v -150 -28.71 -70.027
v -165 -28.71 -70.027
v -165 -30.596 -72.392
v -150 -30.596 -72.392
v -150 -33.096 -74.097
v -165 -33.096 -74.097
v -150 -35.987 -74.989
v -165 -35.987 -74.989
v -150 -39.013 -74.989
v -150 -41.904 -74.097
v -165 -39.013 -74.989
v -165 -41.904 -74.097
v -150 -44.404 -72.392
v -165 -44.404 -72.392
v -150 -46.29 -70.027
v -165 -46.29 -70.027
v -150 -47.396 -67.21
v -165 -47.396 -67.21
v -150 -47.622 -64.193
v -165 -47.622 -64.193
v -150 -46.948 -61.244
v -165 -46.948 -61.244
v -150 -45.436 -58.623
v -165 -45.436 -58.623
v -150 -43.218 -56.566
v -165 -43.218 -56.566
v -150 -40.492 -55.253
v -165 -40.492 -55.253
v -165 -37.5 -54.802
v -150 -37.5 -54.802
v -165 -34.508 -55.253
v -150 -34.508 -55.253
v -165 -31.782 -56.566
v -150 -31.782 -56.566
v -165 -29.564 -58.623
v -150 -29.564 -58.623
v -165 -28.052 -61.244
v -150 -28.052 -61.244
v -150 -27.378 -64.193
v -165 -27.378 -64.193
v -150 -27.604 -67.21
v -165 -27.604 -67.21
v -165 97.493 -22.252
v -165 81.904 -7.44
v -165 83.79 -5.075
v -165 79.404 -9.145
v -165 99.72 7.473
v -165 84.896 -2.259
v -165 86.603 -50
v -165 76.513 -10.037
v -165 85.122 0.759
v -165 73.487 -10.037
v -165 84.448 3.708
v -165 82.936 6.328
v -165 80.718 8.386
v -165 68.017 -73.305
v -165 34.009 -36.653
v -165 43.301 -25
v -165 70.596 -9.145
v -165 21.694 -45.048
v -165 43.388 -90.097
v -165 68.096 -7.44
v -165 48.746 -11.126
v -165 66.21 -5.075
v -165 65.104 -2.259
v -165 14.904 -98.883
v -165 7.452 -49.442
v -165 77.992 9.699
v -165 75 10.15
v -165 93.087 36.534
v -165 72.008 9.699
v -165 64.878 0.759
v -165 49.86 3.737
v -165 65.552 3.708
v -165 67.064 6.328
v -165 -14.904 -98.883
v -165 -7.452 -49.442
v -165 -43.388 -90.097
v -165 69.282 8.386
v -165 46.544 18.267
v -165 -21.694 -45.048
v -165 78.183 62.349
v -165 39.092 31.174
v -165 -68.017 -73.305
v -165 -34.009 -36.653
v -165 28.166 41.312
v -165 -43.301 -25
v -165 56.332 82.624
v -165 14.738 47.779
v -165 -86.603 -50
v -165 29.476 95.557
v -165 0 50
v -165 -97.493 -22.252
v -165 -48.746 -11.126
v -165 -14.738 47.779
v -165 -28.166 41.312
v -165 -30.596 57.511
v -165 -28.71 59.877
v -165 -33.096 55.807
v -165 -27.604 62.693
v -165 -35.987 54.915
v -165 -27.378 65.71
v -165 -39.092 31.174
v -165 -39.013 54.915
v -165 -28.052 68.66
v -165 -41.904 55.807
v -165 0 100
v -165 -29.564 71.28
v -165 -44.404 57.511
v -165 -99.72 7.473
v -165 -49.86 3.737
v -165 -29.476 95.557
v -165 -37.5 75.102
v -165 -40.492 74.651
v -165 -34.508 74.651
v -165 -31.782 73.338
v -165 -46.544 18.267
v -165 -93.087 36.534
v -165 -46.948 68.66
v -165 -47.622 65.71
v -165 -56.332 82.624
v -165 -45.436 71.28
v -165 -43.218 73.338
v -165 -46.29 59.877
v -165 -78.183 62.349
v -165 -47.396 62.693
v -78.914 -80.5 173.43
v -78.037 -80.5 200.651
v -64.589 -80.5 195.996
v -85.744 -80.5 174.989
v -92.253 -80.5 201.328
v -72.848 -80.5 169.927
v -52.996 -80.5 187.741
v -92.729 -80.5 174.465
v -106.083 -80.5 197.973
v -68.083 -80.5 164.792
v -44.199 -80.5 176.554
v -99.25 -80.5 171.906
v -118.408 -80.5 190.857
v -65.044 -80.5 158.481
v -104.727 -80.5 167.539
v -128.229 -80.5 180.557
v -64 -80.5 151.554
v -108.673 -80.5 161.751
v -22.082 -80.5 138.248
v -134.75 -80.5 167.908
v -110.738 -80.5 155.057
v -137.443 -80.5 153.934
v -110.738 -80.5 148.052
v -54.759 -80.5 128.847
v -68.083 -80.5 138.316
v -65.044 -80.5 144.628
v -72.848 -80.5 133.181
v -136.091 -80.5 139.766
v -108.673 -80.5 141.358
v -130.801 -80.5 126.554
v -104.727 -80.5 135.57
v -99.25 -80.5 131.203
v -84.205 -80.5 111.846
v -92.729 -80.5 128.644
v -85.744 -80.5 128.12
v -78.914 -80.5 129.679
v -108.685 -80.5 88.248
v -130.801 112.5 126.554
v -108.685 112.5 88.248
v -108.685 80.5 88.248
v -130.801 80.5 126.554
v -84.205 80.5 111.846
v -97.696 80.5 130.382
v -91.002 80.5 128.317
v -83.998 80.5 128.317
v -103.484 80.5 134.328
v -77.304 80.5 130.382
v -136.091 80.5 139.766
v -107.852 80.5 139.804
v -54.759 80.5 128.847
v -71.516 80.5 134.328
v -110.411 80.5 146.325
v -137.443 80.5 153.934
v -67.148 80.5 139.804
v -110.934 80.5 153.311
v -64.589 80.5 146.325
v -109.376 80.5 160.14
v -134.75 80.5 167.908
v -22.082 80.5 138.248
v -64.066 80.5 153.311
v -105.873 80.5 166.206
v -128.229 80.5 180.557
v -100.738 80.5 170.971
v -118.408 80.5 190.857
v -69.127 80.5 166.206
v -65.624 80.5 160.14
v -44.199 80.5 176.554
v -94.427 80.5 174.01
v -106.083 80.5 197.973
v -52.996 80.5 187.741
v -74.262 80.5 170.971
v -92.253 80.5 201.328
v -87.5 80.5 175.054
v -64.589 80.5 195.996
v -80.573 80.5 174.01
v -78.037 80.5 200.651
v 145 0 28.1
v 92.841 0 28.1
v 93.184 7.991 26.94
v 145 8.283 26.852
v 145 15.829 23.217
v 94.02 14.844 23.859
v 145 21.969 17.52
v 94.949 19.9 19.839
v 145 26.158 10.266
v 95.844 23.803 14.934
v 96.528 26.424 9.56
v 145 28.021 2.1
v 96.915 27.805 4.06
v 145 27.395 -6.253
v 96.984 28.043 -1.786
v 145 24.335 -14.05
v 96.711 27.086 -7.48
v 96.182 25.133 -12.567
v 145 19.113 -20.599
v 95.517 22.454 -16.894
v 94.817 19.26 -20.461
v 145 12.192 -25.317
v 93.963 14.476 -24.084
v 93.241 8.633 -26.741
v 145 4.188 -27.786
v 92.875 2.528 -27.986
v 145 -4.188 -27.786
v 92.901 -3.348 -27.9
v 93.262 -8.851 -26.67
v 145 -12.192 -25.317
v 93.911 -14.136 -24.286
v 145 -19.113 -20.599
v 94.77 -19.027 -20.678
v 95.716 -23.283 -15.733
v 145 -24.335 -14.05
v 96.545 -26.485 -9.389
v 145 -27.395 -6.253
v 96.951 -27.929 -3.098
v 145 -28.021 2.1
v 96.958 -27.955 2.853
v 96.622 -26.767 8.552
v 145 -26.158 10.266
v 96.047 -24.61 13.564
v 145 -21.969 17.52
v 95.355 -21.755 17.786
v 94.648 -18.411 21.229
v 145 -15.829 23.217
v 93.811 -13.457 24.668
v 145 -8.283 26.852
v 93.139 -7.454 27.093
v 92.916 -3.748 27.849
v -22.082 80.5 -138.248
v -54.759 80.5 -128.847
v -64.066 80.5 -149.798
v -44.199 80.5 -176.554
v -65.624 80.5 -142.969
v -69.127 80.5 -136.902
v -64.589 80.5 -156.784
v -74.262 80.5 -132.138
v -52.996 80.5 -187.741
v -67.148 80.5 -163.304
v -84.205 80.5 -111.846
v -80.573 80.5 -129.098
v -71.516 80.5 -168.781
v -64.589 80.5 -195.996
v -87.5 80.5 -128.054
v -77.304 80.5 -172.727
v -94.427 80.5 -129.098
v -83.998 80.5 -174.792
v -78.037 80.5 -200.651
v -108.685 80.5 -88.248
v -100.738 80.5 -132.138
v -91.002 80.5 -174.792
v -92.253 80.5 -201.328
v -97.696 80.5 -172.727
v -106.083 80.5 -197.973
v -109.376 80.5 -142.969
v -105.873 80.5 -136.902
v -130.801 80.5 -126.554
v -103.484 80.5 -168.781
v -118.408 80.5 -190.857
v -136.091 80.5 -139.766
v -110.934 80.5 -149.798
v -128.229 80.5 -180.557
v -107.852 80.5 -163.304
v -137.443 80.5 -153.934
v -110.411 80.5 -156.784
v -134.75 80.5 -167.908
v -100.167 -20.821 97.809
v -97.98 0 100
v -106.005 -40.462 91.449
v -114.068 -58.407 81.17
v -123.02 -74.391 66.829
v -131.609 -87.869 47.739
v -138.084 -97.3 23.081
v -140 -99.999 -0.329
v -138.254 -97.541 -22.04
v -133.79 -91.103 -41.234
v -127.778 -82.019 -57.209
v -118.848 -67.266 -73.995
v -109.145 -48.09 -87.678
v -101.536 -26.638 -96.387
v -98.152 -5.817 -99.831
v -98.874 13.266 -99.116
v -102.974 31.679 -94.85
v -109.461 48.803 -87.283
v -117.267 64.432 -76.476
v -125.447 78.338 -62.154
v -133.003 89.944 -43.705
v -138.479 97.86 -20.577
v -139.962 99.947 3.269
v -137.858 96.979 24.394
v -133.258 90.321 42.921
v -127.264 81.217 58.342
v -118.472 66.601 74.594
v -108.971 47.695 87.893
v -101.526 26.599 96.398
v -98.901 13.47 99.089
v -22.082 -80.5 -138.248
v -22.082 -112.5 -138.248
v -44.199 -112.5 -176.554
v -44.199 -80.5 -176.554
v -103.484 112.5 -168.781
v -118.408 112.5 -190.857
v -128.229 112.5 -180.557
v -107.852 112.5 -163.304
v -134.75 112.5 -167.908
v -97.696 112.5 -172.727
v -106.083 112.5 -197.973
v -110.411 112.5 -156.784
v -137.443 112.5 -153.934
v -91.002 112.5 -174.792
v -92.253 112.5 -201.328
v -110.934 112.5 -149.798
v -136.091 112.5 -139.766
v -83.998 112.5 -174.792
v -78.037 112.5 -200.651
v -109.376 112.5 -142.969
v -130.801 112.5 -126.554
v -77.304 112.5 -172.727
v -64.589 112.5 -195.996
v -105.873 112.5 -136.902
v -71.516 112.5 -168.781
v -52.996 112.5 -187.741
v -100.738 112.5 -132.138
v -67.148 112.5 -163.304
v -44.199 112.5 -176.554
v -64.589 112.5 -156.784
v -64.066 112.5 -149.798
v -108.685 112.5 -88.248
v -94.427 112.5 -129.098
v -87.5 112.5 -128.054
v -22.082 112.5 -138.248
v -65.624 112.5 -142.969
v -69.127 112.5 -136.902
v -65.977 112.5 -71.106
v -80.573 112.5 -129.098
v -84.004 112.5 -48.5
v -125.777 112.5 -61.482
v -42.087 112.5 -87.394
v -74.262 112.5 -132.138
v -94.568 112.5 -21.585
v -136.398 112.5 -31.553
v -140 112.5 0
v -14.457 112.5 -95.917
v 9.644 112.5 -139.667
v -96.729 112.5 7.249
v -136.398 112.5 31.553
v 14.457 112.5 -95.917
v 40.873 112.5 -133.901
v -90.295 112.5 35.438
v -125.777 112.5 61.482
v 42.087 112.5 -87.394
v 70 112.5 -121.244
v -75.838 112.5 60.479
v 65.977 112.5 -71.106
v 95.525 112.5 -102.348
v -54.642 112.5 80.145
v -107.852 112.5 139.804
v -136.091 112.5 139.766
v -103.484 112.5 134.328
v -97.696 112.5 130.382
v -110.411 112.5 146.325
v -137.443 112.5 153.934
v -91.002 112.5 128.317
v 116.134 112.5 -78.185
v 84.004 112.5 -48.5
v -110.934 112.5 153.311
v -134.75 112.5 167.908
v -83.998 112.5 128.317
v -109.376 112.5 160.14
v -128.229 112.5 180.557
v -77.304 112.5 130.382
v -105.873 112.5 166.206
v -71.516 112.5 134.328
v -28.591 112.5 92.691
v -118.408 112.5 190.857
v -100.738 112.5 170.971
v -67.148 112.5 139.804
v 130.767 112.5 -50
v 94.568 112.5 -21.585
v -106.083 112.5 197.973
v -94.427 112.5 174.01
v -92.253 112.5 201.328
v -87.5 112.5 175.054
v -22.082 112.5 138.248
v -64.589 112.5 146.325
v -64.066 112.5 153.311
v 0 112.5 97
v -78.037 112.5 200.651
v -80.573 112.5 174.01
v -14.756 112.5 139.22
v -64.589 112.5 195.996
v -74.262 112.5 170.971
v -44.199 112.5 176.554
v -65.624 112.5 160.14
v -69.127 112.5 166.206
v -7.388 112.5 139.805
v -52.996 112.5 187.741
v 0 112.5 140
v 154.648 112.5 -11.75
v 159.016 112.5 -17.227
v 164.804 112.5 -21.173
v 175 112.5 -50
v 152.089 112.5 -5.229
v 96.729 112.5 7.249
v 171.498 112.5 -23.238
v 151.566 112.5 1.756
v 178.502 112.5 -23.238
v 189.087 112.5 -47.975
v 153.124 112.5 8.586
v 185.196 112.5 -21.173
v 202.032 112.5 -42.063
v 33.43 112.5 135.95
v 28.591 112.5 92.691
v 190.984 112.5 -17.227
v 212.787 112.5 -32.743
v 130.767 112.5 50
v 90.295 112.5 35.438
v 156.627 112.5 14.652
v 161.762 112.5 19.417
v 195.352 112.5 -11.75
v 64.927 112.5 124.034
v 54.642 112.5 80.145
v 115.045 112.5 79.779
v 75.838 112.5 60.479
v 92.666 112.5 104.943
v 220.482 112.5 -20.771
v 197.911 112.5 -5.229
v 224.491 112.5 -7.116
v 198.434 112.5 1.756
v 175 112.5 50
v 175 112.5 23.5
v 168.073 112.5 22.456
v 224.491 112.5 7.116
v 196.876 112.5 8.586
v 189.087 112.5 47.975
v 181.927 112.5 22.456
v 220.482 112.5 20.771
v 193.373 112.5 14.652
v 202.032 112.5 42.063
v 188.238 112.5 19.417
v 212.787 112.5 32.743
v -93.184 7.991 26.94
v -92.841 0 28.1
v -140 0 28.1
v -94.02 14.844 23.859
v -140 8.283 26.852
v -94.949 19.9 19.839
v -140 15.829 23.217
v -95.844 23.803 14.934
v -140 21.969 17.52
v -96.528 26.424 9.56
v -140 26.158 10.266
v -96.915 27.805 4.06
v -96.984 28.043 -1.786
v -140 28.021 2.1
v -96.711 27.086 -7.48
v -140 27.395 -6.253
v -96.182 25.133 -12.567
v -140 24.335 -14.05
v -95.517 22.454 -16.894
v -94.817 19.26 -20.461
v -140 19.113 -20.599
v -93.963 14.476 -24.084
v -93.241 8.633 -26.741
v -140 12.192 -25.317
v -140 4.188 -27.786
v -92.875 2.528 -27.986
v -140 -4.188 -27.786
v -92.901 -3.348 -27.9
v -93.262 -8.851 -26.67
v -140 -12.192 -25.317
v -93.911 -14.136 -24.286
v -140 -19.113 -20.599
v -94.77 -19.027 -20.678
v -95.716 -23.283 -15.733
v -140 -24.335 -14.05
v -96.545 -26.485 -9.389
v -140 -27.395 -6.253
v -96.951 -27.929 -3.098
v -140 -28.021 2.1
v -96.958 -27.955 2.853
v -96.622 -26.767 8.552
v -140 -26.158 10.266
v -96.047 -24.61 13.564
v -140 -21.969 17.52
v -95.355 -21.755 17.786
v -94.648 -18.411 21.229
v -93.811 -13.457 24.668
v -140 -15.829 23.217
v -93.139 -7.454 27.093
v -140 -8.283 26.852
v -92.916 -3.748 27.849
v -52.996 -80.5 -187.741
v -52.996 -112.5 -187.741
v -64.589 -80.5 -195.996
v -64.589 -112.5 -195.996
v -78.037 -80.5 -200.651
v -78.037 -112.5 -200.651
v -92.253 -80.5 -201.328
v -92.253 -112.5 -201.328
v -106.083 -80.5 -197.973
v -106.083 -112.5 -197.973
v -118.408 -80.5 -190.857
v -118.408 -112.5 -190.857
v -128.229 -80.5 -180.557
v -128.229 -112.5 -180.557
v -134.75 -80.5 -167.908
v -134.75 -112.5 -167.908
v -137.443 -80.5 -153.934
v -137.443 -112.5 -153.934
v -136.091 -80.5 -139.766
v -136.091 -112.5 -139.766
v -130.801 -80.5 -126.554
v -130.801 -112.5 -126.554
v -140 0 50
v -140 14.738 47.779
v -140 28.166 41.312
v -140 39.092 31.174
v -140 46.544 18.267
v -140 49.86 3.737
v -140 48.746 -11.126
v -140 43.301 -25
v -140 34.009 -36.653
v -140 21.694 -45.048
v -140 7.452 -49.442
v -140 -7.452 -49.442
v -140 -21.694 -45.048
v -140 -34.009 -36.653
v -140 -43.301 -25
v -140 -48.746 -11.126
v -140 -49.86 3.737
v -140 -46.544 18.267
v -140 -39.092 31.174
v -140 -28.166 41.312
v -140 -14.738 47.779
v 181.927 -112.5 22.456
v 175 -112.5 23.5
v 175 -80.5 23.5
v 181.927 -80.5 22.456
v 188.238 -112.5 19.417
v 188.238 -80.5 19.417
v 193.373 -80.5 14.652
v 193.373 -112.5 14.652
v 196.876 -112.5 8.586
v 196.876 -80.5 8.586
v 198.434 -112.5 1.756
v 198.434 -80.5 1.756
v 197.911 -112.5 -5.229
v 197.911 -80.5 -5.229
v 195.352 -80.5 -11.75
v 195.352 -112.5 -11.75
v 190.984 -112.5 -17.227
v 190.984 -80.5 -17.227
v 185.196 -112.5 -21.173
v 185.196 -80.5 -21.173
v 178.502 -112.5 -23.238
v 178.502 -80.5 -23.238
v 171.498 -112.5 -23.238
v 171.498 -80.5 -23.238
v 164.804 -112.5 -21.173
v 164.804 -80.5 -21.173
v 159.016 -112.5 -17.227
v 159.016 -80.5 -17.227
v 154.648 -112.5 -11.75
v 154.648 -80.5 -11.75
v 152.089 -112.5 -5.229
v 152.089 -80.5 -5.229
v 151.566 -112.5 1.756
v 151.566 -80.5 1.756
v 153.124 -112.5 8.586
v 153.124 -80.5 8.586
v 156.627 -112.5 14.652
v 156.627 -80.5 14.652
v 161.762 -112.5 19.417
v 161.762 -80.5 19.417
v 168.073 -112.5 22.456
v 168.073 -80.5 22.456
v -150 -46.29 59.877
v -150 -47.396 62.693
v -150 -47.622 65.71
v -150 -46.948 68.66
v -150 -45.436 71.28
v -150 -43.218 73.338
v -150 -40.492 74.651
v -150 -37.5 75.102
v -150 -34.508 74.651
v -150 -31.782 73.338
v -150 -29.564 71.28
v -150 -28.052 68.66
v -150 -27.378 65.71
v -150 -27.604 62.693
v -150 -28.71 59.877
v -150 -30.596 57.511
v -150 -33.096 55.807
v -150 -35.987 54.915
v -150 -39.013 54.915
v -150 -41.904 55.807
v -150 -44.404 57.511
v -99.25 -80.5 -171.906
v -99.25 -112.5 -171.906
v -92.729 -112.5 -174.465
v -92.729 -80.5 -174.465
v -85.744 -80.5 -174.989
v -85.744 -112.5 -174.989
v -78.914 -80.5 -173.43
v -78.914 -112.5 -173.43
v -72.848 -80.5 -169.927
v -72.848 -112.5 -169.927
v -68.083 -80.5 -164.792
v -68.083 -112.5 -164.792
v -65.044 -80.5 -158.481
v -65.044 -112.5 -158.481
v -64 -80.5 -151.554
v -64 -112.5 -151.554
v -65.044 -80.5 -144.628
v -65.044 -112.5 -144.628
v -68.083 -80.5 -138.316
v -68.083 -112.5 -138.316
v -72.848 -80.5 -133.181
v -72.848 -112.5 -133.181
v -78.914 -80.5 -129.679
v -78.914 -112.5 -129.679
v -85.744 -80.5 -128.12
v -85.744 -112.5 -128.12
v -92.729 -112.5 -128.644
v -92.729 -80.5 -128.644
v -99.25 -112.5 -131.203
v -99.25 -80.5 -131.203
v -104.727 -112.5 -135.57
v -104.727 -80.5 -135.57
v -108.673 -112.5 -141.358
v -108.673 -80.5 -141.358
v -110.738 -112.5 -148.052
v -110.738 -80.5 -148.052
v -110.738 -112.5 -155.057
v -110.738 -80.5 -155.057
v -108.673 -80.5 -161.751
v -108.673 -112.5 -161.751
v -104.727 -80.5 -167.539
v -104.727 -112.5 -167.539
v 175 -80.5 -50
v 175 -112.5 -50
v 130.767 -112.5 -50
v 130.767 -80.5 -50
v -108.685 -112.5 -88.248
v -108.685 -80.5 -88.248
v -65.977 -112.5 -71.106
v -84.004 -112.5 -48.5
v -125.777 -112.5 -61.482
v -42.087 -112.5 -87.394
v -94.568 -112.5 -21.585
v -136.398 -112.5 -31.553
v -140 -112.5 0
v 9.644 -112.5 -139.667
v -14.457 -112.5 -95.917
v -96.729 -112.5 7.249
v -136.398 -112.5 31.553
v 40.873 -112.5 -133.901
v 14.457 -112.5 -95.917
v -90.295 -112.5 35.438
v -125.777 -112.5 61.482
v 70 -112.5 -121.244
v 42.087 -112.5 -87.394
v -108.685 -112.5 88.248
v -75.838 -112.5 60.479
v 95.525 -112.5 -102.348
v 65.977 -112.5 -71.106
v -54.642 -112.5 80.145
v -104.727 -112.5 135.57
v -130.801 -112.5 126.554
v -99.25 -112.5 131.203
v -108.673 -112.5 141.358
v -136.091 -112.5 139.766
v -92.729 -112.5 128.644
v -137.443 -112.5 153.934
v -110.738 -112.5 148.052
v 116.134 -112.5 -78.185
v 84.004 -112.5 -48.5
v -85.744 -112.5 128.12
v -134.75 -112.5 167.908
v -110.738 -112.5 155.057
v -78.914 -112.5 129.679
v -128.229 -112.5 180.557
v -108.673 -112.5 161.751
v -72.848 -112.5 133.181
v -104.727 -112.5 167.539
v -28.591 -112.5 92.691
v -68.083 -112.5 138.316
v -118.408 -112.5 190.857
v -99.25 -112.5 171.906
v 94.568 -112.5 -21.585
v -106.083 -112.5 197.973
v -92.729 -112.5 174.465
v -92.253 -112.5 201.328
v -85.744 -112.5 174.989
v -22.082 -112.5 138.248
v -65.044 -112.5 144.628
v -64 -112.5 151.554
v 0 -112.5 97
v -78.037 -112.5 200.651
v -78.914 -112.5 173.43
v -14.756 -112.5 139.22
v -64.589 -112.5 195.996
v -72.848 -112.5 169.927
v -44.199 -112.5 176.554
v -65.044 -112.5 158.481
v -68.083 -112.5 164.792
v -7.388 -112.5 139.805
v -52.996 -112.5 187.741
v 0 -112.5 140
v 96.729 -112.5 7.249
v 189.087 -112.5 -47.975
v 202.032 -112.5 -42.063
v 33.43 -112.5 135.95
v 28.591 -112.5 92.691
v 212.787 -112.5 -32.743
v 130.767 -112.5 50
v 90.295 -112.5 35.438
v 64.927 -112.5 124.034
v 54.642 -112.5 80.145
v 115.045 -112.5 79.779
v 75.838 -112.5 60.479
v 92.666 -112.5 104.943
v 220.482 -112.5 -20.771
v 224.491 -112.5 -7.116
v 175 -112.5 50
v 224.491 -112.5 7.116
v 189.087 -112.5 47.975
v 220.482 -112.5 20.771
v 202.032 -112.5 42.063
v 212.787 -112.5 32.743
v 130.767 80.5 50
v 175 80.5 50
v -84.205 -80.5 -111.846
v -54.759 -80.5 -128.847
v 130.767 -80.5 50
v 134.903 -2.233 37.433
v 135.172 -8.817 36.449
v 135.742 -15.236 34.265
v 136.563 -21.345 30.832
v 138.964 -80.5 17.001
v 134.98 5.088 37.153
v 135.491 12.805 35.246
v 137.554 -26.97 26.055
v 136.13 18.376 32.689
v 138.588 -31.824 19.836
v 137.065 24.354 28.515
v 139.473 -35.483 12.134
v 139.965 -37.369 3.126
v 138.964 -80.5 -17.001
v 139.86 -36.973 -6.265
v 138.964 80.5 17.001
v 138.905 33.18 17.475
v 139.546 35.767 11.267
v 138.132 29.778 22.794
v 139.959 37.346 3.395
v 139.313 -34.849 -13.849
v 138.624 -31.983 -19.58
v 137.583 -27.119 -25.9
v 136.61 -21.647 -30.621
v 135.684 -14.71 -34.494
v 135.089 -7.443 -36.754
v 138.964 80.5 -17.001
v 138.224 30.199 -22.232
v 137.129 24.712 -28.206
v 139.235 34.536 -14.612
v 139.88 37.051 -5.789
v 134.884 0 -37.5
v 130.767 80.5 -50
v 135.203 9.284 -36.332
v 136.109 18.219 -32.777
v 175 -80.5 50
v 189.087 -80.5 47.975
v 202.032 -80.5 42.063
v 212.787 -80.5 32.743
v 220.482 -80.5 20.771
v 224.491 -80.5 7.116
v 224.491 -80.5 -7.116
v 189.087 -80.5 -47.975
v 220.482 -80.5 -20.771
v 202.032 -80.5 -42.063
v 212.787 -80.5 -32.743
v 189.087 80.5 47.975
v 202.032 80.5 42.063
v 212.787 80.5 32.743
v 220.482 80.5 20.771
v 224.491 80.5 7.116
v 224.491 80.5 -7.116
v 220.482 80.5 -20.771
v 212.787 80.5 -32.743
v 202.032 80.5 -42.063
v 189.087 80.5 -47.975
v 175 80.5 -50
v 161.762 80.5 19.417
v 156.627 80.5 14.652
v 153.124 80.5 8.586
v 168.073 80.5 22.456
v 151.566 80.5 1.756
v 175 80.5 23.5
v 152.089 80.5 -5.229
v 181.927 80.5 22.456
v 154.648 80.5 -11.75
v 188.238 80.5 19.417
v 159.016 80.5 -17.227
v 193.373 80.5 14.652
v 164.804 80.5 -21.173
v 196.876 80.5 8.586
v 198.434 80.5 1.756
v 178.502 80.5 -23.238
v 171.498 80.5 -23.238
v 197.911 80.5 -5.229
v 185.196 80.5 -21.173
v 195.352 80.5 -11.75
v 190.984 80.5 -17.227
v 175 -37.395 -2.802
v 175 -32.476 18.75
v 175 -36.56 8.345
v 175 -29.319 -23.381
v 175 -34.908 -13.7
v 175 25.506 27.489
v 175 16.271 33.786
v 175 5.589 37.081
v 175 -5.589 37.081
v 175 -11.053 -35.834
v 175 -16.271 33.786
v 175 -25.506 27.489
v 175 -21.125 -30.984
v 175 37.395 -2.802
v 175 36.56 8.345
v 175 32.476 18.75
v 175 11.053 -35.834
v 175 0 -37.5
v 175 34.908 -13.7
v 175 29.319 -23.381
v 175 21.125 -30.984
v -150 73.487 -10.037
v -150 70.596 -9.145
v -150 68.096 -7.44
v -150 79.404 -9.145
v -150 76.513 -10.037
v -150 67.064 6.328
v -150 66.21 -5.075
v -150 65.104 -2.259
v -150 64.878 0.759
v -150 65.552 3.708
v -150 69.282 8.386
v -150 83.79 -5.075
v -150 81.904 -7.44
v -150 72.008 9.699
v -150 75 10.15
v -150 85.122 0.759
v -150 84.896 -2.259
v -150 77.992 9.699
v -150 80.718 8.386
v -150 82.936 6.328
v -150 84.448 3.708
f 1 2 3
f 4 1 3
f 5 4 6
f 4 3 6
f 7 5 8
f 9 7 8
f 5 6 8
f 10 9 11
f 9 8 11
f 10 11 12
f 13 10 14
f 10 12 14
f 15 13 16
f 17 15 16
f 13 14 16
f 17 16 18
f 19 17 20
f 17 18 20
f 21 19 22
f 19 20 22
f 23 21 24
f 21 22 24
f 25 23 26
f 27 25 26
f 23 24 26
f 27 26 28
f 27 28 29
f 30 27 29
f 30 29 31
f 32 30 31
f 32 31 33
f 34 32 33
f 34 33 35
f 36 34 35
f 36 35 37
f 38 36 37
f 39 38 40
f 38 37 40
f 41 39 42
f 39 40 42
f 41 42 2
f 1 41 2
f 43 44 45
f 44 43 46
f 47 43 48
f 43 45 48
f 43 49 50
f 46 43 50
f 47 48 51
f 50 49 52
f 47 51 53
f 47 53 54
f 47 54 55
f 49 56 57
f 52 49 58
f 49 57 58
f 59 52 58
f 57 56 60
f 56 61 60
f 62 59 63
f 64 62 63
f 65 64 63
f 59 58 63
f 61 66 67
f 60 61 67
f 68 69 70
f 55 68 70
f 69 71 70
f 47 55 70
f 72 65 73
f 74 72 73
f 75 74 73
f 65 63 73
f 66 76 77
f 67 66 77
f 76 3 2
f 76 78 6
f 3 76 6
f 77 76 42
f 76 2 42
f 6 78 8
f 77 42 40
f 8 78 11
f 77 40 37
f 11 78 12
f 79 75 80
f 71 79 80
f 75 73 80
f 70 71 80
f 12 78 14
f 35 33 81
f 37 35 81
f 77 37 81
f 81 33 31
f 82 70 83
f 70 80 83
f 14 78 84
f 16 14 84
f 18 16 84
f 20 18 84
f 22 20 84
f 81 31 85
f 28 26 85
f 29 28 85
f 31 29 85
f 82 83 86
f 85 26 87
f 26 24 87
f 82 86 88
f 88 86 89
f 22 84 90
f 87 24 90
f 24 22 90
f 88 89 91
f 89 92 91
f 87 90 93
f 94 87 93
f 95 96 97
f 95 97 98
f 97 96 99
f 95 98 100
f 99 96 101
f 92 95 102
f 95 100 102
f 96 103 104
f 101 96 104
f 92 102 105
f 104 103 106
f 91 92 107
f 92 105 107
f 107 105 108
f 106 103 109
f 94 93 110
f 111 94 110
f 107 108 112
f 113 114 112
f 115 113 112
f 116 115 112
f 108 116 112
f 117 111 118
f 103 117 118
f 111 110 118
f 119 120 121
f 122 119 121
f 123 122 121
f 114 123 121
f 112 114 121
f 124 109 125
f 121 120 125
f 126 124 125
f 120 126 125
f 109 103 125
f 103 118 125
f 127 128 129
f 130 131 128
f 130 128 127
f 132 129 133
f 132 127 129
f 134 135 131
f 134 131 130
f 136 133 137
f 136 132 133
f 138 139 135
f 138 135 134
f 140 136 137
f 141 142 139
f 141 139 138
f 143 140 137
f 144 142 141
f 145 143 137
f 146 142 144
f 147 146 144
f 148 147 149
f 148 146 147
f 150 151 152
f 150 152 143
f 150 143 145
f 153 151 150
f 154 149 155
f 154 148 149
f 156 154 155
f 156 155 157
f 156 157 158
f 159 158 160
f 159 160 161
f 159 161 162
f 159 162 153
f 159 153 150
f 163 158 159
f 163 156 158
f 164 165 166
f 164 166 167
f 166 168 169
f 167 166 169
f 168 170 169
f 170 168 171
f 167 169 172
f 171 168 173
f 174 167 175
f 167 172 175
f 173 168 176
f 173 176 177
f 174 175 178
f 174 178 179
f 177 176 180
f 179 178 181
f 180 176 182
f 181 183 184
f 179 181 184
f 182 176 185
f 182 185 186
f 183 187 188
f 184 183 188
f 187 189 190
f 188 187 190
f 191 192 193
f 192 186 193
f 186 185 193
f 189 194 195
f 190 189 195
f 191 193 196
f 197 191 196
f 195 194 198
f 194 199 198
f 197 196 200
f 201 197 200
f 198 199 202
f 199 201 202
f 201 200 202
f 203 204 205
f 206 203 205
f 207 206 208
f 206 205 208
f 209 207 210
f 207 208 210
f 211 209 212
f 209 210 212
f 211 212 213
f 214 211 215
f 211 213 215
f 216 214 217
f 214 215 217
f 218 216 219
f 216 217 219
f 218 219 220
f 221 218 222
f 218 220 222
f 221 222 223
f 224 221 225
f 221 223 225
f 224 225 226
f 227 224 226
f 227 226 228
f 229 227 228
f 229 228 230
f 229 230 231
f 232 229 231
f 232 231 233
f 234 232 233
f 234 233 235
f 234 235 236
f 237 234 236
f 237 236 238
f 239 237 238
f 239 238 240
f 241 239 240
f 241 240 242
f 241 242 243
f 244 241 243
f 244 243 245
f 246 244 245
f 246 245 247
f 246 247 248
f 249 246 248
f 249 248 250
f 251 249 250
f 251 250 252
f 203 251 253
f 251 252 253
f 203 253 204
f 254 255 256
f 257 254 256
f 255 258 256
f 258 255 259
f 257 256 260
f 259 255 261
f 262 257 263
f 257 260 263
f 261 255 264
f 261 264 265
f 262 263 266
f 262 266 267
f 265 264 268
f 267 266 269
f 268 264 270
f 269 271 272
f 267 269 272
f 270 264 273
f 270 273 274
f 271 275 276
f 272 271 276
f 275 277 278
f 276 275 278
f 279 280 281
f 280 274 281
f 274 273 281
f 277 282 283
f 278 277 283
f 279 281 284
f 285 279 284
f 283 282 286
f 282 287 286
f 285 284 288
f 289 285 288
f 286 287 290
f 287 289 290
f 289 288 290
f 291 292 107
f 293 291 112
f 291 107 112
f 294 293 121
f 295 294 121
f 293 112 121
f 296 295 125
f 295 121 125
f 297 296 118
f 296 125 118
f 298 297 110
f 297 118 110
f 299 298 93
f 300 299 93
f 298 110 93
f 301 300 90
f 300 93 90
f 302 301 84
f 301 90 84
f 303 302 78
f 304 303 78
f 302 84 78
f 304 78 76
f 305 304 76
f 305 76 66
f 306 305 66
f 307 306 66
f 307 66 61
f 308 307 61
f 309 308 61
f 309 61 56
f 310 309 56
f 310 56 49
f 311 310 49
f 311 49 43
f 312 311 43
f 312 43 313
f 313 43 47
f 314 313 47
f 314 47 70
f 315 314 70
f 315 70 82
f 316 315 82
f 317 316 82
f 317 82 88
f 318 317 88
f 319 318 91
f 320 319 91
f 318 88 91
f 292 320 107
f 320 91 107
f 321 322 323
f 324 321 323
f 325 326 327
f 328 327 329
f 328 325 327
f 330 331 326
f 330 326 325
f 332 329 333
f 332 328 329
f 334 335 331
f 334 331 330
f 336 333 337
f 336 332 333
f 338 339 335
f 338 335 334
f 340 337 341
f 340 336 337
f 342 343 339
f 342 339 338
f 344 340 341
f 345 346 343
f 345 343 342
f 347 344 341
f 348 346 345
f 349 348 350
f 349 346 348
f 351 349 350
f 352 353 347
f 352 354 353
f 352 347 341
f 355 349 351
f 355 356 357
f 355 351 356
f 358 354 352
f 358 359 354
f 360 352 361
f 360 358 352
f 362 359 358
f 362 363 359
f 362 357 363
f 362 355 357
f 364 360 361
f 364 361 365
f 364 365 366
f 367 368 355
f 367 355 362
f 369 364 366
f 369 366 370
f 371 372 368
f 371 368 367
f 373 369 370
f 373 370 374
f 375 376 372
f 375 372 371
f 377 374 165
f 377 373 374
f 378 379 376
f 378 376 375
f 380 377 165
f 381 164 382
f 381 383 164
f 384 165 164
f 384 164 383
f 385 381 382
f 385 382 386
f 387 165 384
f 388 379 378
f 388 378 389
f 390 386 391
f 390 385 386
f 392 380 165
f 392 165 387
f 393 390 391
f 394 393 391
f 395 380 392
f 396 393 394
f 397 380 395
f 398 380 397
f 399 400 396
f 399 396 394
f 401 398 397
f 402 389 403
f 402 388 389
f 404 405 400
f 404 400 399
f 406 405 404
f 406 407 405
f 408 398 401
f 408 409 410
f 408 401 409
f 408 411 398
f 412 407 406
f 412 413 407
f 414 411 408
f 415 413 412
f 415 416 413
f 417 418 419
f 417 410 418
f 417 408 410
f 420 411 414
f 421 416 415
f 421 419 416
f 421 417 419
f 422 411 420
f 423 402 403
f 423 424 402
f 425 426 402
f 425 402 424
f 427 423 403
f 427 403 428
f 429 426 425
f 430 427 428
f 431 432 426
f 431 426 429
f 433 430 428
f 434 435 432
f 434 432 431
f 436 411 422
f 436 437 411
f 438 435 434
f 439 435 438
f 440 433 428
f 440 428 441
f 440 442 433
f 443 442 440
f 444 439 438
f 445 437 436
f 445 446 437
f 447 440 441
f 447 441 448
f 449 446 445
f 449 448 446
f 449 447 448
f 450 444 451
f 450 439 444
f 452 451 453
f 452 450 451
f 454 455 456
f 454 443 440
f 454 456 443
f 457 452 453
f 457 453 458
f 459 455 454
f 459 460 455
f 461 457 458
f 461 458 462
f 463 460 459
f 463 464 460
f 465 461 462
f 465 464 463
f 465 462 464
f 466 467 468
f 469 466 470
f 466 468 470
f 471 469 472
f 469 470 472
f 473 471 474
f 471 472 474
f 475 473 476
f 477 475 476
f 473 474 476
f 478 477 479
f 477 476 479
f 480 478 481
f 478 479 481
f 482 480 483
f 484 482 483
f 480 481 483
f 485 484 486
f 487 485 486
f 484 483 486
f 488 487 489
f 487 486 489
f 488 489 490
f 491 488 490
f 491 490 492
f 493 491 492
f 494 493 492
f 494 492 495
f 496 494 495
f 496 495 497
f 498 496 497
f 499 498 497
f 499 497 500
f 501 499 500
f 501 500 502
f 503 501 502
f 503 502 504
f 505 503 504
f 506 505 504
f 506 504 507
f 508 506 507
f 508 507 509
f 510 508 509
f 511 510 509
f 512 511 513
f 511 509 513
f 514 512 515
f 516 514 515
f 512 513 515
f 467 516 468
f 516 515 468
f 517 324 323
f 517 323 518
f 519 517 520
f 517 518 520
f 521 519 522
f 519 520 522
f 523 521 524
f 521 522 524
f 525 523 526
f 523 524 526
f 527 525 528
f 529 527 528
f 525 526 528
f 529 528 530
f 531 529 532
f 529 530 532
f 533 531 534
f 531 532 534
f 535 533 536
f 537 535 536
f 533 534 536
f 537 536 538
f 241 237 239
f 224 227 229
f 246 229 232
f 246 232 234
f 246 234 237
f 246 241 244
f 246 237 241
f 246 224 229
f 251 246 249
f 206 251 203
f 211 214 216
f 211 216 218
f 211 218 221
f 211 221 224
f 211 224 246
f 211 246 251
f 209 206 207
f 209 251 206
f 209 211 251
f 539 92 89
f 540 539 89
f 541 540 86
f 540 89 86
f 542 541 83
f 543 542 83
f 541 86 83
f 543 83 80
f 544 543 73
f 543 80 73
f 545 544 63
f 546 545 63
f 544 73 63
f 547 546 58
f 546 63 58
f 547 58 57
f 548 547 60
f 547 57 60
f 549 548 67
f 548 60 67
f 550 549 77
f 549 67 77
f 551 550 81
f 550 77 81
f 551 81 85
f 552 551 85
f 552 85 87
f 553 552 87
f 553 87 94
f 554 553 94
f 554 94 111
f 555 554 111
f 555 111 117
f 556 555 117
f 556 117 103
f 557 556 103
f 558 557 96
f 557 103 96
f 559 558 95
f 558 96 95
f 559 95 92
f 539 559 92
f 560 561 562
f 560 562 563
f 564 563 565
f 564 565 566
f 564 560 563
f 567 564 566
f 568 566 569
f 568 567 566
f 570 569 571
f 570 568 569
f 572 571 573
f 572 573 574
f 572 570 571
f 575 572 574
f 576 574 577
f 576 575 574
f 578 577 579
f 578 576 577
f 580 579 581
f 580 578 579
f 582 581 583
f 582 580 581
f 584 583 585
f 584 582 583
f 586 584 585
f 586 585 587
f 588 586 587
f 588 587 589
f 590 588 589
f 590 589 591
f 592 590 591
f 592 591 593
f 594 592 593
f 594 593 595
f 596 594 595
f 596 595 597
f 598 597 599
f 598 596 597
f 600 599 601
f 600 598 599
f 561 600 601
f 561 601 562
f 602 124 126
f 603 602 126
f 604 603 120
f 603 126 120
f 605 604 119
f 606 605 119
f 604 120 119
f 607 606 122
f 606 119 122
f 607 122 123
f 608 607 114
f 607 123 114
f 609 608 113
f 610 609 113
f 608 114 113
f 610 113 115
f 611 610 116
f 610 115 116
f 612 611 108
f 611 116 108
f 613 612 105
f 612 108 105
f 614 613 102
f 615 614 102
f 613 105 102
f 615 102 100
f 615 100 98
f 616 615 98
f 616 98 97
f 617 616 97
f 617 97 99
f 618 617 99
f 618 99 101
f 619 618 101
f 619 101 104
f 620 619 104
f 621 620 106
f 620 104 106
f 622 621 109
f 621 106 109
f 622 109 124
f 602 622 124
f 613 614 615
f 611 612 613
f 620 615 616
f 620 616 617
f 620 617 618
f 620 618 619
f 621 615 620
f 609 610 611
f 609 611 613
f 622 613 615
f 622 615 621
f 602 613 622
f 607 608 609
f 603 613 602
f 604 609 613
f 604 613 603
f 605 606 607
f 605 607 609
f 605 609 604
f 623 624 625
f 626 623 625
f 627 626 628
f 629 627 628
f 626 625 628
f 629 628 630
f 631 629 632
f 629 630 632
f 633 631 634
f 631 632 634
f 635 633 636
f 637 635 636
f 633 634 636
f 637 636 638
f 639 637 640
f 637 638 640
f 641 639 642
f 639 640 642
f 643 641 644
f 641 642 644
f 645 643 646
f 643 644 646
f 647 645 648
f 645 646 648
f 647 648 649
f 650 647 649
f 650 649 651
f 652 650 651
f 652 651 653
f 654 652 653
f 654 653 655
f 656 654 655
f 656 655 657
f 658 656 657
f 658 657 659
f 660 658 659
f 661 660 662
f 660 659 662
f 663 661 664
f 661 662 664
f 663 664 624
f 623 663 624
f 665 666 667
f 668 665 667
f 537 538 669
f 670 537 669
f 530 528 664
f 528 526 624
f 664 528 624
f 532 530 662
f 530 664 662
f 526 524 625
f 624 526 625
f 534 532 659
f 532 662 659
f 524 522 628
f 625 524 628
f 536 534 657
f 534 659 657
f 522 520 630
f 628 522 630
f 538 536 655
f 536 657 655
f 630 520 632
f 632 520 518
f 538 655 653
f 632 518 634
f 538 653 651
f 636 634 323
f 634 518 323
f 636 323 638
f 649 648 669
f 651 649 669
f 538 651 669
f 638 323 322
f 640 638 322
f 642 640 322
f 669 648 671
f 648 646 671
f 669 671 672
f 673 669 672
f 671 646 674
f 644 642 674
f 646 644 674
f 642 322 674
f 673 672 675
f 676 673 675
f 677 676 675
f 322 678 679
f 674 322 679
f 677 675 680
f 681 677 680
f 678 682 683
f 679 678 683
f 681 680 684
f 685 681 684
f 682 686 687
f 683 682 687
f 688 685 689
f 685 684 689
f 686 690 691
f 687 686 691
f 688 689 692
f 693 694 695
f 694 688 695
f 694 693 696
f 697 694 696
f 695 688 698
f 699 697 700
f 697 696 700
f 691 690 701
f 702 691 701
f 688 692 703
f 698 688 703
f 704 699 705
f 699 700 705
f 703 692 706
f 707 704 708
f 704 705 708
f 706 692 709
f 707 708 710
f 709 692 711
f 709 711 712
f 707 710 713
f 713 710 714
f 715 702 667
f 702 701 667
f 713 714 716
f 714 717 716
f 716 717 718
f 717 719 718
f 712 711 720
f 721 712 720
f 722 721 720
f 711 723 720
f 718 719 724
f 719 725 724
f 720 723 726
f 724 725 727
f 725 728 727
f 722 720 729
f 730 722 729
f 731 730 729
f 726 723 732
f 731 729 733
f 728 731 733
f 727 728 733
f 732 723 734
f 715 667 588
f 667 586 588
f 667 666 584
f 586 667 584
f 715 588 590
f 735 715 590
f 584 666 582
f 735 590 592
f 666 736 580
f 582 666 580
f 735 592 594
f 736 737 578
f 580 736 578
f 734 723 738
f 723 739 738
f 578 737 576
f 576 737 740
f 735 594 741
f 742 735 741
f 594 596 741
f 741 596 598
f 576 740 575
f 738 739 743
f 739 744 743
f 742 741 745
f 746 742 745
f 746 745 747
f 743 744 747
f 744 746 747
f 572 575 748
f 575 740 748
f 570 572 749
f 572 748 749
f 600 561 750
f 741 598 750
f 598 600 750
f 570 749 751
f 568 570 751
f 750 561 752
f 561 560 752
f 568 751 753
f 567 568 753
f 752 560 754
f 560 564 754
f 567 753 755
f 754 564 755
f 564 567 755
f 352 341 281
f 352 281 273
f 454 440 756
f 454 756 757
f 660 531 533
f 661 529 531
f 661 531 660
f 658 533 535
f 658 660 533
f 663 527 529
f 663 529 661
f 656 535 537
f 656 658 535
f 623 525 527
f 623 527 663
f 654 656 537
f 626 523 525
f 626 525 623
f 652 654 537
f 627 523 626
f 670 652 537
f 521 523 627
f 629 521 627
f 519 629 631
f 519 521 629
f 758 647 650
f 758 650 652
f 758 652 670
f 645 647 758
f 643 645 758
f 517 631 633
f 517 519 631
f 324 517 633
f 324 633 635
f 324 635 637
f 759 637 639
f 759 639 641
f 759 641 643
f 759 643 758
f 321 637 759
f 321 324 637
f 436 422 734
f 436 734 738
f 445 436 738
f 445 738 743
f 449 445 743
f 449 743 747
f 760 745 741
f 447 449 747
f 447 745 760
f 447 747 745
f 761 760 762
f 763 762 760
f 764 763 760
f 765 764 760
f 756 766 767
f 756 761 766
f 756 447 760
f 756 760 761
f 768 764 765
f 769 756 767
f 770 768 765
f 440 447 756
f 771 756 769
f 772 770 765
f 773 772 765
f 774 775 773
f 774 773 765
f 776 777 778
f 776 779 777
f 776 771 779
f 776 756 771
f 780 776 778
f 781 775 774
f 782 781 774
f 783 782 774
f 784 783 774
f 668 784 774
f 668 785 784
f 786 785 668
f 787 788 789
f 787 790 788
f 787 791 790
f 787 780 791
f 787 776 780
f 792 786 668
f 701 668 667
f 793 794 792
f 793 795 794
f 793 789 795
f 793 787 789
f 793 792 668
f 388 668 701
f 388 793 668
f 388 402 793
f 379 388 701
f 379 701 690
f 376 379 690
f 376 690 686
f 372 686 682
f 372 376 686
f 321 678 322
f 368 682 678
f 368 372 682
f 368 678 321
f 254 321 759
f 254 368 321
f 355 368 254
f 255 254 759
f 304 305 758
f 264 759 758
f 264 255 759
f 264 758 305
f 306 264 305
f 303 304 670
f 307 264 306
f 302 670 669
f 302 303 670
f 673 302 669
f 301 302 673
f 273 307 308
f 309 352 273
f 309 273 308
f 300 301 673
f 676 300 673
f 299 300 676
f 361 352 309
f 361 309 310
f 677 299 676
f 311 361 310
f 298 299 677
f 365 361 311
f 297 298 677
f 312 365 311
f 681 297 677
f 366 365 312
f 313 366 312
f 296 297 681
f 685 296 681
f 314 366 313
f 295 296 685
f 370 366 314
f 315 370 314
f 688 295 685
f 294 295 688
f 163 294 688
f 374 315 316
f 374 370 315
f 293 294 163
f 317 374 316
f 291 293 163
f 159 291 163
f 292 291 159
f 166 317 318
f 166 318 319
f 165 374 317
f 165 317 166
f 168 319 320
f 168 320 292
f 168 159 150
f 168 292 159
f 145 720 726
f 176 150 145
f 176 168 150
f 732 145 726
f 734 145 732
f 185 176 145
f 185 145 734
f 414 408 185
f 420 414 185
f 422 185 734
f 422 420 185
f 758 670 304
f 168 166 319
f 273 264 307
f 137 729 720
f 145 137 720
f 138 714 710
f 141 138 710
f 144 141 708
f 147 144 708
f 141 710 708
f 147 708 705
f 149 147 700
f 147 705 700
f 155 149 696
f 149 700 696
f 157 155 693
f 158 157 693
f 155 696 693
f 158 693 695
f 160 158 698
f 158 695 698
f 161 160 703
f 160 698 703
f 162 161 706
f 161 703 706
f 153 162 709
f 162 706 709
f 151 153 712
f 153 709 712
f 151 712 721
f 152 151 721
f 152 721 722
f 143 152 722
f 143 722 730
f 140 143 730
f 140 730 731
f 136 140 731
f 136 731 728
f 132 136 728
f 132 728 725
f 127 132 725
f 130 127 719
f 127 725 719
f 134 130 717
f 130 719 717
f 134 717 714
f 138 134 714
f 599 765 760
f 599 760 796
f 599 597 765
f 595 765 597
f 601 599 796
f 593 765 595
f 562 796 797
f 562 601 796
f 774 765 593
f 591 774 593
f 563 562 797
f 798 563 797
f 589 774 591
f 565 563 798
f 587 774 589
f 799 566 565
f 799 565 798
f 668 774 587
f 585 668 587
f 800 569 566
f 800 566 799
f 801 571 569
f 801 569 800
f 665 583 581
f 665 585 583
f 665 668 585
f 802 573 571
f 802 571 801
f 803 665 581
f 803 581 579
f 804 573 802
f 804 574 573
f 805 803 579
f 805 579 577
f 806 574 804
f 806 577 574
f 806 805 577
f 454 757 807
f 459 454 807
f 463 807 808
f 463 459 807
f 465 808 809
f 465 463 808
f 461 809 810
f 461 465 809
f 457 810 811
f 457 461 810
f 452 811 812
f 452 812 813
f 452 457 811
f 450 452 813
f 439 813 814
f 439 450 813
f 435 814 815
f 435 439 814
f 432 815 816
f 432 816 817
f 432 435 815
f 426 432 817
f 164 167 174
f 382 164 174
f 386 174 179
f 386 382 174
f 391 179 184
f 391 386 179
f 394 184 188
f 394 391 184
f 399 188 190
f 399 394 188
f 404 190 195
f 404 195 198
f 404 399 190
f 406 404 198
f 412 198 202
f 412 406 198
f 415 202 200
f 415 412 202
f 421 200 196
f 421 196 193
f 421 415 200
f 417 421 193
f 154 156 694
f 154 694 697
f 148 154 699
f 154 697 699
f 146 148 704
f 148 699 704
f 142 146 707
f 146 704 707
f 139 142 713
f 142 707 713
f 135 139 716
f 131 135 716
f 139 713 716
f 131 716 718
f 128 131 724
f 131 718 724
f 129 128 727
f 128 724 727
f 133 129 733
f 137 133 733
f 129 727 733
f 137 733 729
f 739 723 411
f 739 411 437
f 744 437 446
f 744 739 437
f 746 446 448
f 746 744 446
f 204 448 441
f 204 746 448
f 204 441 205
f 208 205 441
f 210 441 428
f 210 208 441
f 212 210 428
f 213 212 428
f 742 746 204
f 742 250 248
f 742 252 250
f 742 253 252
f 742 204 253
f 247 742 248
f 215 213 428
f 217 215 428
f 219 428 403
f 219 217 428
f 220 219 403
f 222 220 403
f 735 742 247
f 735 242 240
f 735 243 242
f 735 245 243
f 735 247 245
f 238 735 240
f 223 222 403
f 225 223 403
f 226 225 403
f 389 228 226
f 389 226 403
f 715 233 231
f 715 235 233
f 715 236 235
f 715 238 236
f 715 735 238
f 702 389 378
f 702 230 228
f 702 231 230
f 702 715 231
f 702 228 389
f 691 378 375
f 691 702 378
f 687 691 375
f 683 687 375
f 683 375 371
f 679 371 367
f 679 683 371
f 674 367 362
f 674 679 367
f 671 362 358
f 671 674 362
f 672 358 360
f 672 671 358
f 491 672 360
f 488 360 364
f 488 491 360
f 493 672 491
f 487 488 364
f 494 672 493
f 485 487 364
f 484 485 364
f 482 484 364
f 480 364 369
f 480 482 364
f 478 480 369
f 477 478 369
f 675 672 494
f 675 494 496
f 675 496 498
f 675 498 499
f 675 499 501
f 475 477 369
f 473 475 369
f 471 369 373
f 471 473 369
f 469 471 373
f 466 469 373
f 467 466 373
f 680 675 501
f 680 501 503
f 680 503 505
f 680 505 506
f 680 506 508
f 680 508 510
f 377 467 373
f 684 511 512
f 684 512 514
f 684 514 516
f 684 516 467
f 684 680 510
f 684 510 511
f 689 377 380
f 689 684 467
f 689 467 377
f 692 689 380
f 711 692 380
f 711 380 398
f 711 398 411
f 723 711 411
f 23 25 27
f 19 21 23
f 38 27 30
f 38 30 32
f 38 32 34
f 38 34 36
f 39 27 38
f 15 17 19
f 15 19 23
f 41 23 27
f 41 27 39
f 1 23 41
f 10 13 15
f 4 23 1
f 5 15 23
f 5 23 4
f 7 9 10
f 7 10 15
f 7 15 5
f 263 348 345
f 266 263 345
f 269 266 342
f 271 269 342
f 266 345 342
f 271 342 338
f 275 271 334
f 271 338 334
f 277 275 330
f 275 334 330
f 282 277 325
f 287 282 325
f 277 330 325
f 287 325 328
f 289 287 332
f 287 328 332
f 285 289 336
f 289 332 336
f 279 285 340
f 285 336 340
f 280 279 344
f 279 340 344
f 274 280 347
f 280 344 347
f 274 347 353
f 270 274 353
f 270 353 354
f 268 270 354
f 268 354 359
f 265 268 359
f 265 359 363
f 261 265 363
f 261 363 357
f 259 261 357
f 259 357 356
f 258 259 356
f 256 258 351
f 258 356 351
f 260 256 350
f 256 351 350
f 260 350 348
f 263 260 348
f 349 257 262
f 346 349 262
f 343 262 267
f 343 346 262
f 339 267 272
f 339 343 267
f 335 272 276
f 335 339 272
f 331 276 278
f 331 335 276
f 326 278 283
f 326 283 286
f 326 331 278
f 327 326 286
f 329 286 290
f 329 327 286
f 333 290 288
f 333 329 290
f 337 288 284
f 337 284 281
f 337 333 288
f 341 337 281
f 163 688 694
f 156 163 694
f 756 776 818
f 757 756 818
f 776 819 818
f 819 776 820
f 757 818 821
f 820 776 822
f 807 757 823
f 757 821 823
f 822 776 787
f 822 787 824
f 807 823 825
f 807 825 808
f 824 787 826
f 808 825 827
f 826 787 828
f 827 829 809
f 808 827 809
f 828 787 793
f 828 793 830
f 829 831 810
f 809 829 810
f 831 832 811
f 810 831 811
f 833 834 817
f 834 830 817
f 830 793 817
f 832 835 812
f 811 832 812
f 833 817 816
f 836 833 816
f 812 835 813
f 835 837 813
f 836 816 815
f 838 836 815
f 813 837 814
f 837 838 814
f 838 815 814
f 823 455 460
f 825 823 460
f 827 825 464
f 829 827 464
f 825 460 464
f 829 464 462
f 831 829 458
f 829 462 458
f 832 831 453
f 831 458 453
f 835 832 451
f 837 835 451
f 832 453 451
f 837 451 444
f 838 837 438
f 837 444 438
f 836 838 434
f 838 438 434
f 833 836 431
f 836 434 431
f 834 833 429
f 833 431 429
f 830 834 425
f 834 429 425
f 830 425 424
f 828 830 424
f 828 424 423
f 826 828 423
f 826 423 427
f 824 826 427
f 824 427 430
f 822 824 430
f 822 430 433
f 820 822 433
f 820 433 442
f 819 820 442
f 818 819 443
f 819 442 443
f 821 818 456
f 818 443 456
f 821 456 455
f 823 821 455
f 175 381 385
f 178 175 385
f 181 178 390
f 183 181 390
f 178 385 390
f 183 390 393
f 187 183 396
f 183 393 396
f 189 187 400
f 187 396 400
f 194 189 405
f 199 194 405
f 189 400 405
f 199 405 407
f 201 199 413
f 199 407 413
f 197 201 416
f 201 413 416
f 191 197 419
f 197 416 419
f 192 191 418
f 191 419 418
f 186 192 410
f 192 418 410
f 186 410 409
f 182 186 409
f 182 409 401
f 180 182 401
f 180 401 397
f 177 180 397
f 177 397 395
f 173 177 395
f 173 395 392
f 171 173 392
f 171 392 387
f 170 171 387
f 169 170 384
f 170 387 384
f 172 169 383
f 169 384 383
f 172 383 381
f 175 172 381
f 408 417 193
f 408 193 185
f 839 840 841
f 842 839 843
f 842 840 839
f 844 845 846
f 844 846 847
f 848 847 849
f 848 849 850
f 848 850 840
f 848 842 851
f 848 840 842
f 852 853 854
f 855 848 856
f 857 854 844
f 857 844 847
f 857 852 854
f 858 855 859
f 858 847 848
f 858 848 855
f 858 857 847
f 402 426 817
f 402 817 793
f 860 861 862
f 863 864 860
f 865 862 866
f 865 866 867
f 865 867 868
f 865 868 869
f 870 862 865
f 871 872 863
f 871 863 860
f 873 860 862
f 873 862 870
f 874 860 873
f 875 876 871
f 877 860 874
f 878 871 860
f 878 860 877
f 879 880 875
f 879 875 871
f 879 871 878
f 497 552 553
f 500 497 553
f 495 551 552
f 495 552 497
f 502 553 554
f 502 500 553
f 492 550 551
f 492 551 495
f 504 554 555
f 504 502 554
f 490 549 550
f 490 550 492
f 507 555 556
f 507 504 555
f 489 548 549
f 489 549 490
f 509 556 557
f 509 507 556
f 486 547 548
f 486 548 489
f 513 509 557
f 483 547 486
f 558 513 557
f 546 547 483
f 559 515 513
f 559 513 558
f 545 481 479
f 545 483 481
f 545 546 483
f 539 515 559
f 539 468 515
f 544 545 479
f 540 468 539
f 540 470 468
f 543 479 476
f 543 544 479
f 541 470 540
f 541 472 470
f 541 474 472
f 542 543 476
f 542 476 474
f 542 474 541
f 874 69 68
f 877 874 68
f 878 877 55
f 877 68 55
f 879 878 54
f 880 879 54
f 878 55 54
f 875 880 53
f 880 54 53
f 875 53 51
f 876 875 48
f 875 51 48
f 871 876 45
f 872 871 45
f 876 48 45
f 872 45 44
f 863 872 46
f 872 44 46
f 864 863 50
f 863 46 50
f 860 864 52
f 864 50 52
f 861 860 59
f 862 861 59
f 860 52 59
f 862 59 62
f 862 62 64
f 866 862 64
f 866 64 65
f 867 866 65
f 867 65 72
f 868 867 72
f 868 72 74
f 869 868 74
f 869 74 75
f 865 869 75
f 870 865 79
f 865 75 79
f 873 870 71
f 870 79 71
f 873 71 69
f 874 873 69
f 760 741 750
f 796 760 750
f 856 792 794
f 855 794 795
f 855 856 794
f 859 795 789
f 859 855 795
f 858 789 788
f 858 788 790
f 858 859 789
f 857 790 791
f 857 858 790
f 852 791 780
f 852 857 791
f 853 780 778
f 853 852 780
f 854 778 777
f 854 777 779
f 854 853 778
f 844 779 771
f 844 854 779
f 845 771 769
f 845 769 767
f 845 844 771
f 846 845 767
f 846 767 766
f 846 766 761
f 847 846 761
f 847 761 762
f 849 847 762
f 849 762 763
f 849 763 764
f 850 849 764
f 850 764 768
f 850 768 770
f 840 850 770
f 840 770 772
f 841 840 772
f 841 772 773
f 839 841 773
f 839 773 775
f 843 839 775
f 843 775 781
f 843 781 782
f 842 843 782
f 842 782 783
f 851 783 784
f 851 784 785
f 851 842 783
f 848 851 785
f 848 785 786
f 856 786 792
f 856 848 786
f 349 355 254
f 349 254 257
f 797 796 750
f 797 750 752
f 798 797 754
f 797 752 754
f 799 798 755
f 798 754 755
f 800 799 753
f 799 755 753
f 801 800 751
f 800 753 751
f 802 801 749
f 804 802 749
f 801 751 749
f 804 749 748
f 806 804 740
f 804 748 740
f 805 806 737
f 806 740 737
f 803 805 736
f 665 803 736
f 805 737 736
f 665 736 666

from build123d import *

# Parameters (mm, degrees)
SKETCH1_R                = 140
SKETCH1_R_2              = 97
BOSS_EXTRUDE1_DEPTH      = 112.5
SKETCH2_R                = 23.5
BOSS_EXTRUDE2_DEPTH      = 32
CIRPATTERN1_COUNT        = 3
MIRROR1_COPY_1_SKETCH_R  = 23.5
MIRROR1_COPY_1_DEPTH     = 32
MIRROR1_COPY_2_SKETCH_R  = 23.5
MIRROR1_COPY_2_DEPTH     = 32
BOSS_EXTRUDE3_REACH      = 489.344
BOSS_EXTRUDE3_END_RADIUS = 140
BOSS_EXTRUDE3_START      = -165
SKETCH3_R                = 100
BOSS_EXTRUDE4_REACH      = 499.344
BOSS_EXTRUDE4_END_RADIUS = 140
BOSS_EXTRUDE4_START      = 175
SKETCH4_R                = 37.5
SKETCH5_R                = 50
CUT_EXTRUDE1_DEPTH       = 25
SKETCH6_R                = 28.1
CUT_EXTRUDE2_DEPTH       = 310
SKETCH9_R                = 10.15
CUT_EXTRUDE3_DEPTH       = 15
CIRPATTERN2_COUNT        = 3


with BuildPart() as part:
    # Sketch1 → Boss-Extrude1 (new, symmetric)
    with BuildSketch(Plane(origin=(0, 0, 0), x_dir=(1, 0, 0), z_dir=(0, 1, 0))):
        with Locations(Location((0, 0, 0), (0, 0, 270))):
            Circle(SKETCH1_R)
        with Locations(Location((0, 0, 0), (0, 0, 270))):
            Circle(SKETCH1_R_2, mode=Mode.SUBTRACT)
    extrude(amount=BOSS_EXTRUDE1_DEPTH, both=True)

    # Sketch2 → Boss-Extrude2 (add)
    with BuildSketch(Plane(origin=(0, 112.5, 0), x_dir=(1, 0, 0), z_dir=(0, 1, 0))):
        with BuildLine():
            Line((175, 50), (130.766968306, 50))
            ThreePointArc((130.766968306, 50), (140, 0), (130.766968306, -50))
            Line((130.766968306, -50), (175, -50))
            ThreePointArc((175, -50), (225, 0), (175, 50))
        make_face()
        with Locations(Location((175, 0, 0), (0, 0, 270))):
            Circle(SKETCH2_R, mode=Mode.SUBTRACT)
    boss_extrude2 = extrude(amount=-BOSS_EXTRUDE2_DEPTH)

    # CirPattern1: Boss-Extrude2 ×3 about axis
    cirpattern1_axis = Axis((0, 0, 0), (0, 1, 0))
    for i in range(1, CIRPATTERN1_COUNT):
        add(boss_extrude2.rotate(cirpattern1_axis, i * 360 / CIRPATTERN1_COUNT))

    # Mirror1: Boss-Extrude2 across plane
    add(boss_extrude2.mirror(Plane.ZX))

    # Mirror1 copy 1 sketch → Mirror1 copy 1 (add)
    with BuildSketch(Plane(origin=(0, -112.5, 0), x_dir=(-0.4999999999999998, 0, -0.8660254037844387), z_dir=(0, -1, 0))):
        with BuildLine():
            Line((175, -50), (130.766968306, -50))
            ThreePointArc((130.766968306, -50), (140, 0), (130.766968306, 50))
            Line((130.766968306, 50), (175, 50))
            ThreePointArc((175, 50), (225, 0), (175, -50))
        make_face()
        with Locations((175, 0)):
            Circle(MIRROR1_COPY_1_SKETCH_R, mode=Mode.SUBTRACT)
    extrude(amount=-MIRROR1_COPY_1_DEPTH)

    # Mirror1 copy 2 sketch → Mirror1 copy 2 (add)
    with BuildSketch(Plane(origin=(0, -112.5, 0), x_dir=(-0.5000000000000004, 0, 0.8660254037844384), z_dir=(0, -1, 0))):
        with BuildLine():
            Line((175, -50), (130.766968306, -50))
            ThreePointArc((130.766968306, -50), (140, 0), (130.766968306, 50))
            Line((130.766968306, 50), (175, 50))
            ThreePointArc((175, 50), (225, 0), (175, -50))
        make_face()
        with Locations((175, 0)):
            Circle(MIRROR1_COPY_2_SKETCH_R, mode=Mode.SUBTRACT)
    extrude(amount=-MIRROR1_COPY_2_DEPTH)

    # Boss-Extrude3: up to this cylinder (the profile starts outside it)
    boss_extrude3_end = Plane(origin=(0, 0, 0), z_dir=(0, -1, 0)) * Cylinder(BOSS_EXTRUDE3_END_RADIUS, 1259.688, mode=Mode.PRIVATE)
    # Sketch3 → Boss-Extrude3 (add, up to the surface)
    with BuildSketch(Plane(origin=(0, 0, 0), x_dir=(0, 0, -1), z_dir=(1, 0, 0)).offset(BOSS_EXTRUDE3_START), mode=Mode.PRIVATE) as boss_extrude3_sk1:
        with Locations(Location((0, 0, 0), (0, 0, 180))):
            Circle(SKETCH3_R)
    boss_extrude3_tool1 = extrude(boss_extrude3_sk1.sketch, amount=BOSS_EXTRUDE3_REACH, mode=Mode.PRIVATE) - boss_extrude3_end
    add(boss_extrude3_tool1.solids().sort_by_distance((-165, 0, 0))[0])

    # Boss-Extrude4: up to this cylinder (the profile starts outside it)
    boss_extrude4_end = Plane(origin=(0, 0, 0), z_dir=(0, -1, 0)) * Cylinder(BOSS_EXTRUDE4_END_RADIUS, 1279.688, mode=Mode.PRIVATE)
    # Sketch4 → Boss-Extrude4 (add, up to the surface)
    with BuildSketch(Plane(origin=(0, 0, 0), x_dir=(0, 0, -1), z_dir=(1, 0, 0)).offset(BOSS_EXTRUDE4_START), mode=Mode.PRIVATE) as boss_extrude4_sk1:
        Circle(SKETCH4_R)
    boss_extrude4_tool1 = extrude(boss_extrude4_sk1.sketch, amount=-BOSS_EXTRUDE4_REACH, mode=Mode.PRIVATE) - boss_extrude4_end
    add(boss_extrude4_tool1.solids().sort_by_distance((175, 0, 0))[0])

    # Sketch5 → Cut-Extrude1 (cut)
    with BuildSketch(Plane.ZY.offset(165)):
        Circle(SKETCH5_R)
    extrude(amount=-CUT_EXTRUDE1_DEPTH, mode=Mode.SUBTRACT)

    # Sketch6 → Cut-Extrude2 (cut)
    with BuildSketch(Plane.ZY.offset(165)):
        Circle(SKETCH6_R)
    extrude(amount=-CUT_EXTRUDE2_DEPTH, mode=Mode.SUBTRACT)

    # Sketch9 → Cut-Extrude3 (cut)
    with BuildSketch(Plane.ZY.offset(165)):
        with Locations((0, 75)):
            Circle(SKETCH9_R)
    cut_extrude3 = extrude(amount=-CUT_EXTRUDE3_DEPTH, mode=Mode.SUBTRACT)

    # CirPattern2: Cut-Extrude3 ×3 about axis
    cirpattern2_axis = Axis((0, 0, 0), (1, 0, 0))
    for i in range(1, CIRPATTERN2_COUNT):
        add(cut_extrude3.rotate(cirpattern2_axis, i * 360 / CIRPATTERN2_COUNT), mode=Mode.SUBTRACT)


solid = part.part
